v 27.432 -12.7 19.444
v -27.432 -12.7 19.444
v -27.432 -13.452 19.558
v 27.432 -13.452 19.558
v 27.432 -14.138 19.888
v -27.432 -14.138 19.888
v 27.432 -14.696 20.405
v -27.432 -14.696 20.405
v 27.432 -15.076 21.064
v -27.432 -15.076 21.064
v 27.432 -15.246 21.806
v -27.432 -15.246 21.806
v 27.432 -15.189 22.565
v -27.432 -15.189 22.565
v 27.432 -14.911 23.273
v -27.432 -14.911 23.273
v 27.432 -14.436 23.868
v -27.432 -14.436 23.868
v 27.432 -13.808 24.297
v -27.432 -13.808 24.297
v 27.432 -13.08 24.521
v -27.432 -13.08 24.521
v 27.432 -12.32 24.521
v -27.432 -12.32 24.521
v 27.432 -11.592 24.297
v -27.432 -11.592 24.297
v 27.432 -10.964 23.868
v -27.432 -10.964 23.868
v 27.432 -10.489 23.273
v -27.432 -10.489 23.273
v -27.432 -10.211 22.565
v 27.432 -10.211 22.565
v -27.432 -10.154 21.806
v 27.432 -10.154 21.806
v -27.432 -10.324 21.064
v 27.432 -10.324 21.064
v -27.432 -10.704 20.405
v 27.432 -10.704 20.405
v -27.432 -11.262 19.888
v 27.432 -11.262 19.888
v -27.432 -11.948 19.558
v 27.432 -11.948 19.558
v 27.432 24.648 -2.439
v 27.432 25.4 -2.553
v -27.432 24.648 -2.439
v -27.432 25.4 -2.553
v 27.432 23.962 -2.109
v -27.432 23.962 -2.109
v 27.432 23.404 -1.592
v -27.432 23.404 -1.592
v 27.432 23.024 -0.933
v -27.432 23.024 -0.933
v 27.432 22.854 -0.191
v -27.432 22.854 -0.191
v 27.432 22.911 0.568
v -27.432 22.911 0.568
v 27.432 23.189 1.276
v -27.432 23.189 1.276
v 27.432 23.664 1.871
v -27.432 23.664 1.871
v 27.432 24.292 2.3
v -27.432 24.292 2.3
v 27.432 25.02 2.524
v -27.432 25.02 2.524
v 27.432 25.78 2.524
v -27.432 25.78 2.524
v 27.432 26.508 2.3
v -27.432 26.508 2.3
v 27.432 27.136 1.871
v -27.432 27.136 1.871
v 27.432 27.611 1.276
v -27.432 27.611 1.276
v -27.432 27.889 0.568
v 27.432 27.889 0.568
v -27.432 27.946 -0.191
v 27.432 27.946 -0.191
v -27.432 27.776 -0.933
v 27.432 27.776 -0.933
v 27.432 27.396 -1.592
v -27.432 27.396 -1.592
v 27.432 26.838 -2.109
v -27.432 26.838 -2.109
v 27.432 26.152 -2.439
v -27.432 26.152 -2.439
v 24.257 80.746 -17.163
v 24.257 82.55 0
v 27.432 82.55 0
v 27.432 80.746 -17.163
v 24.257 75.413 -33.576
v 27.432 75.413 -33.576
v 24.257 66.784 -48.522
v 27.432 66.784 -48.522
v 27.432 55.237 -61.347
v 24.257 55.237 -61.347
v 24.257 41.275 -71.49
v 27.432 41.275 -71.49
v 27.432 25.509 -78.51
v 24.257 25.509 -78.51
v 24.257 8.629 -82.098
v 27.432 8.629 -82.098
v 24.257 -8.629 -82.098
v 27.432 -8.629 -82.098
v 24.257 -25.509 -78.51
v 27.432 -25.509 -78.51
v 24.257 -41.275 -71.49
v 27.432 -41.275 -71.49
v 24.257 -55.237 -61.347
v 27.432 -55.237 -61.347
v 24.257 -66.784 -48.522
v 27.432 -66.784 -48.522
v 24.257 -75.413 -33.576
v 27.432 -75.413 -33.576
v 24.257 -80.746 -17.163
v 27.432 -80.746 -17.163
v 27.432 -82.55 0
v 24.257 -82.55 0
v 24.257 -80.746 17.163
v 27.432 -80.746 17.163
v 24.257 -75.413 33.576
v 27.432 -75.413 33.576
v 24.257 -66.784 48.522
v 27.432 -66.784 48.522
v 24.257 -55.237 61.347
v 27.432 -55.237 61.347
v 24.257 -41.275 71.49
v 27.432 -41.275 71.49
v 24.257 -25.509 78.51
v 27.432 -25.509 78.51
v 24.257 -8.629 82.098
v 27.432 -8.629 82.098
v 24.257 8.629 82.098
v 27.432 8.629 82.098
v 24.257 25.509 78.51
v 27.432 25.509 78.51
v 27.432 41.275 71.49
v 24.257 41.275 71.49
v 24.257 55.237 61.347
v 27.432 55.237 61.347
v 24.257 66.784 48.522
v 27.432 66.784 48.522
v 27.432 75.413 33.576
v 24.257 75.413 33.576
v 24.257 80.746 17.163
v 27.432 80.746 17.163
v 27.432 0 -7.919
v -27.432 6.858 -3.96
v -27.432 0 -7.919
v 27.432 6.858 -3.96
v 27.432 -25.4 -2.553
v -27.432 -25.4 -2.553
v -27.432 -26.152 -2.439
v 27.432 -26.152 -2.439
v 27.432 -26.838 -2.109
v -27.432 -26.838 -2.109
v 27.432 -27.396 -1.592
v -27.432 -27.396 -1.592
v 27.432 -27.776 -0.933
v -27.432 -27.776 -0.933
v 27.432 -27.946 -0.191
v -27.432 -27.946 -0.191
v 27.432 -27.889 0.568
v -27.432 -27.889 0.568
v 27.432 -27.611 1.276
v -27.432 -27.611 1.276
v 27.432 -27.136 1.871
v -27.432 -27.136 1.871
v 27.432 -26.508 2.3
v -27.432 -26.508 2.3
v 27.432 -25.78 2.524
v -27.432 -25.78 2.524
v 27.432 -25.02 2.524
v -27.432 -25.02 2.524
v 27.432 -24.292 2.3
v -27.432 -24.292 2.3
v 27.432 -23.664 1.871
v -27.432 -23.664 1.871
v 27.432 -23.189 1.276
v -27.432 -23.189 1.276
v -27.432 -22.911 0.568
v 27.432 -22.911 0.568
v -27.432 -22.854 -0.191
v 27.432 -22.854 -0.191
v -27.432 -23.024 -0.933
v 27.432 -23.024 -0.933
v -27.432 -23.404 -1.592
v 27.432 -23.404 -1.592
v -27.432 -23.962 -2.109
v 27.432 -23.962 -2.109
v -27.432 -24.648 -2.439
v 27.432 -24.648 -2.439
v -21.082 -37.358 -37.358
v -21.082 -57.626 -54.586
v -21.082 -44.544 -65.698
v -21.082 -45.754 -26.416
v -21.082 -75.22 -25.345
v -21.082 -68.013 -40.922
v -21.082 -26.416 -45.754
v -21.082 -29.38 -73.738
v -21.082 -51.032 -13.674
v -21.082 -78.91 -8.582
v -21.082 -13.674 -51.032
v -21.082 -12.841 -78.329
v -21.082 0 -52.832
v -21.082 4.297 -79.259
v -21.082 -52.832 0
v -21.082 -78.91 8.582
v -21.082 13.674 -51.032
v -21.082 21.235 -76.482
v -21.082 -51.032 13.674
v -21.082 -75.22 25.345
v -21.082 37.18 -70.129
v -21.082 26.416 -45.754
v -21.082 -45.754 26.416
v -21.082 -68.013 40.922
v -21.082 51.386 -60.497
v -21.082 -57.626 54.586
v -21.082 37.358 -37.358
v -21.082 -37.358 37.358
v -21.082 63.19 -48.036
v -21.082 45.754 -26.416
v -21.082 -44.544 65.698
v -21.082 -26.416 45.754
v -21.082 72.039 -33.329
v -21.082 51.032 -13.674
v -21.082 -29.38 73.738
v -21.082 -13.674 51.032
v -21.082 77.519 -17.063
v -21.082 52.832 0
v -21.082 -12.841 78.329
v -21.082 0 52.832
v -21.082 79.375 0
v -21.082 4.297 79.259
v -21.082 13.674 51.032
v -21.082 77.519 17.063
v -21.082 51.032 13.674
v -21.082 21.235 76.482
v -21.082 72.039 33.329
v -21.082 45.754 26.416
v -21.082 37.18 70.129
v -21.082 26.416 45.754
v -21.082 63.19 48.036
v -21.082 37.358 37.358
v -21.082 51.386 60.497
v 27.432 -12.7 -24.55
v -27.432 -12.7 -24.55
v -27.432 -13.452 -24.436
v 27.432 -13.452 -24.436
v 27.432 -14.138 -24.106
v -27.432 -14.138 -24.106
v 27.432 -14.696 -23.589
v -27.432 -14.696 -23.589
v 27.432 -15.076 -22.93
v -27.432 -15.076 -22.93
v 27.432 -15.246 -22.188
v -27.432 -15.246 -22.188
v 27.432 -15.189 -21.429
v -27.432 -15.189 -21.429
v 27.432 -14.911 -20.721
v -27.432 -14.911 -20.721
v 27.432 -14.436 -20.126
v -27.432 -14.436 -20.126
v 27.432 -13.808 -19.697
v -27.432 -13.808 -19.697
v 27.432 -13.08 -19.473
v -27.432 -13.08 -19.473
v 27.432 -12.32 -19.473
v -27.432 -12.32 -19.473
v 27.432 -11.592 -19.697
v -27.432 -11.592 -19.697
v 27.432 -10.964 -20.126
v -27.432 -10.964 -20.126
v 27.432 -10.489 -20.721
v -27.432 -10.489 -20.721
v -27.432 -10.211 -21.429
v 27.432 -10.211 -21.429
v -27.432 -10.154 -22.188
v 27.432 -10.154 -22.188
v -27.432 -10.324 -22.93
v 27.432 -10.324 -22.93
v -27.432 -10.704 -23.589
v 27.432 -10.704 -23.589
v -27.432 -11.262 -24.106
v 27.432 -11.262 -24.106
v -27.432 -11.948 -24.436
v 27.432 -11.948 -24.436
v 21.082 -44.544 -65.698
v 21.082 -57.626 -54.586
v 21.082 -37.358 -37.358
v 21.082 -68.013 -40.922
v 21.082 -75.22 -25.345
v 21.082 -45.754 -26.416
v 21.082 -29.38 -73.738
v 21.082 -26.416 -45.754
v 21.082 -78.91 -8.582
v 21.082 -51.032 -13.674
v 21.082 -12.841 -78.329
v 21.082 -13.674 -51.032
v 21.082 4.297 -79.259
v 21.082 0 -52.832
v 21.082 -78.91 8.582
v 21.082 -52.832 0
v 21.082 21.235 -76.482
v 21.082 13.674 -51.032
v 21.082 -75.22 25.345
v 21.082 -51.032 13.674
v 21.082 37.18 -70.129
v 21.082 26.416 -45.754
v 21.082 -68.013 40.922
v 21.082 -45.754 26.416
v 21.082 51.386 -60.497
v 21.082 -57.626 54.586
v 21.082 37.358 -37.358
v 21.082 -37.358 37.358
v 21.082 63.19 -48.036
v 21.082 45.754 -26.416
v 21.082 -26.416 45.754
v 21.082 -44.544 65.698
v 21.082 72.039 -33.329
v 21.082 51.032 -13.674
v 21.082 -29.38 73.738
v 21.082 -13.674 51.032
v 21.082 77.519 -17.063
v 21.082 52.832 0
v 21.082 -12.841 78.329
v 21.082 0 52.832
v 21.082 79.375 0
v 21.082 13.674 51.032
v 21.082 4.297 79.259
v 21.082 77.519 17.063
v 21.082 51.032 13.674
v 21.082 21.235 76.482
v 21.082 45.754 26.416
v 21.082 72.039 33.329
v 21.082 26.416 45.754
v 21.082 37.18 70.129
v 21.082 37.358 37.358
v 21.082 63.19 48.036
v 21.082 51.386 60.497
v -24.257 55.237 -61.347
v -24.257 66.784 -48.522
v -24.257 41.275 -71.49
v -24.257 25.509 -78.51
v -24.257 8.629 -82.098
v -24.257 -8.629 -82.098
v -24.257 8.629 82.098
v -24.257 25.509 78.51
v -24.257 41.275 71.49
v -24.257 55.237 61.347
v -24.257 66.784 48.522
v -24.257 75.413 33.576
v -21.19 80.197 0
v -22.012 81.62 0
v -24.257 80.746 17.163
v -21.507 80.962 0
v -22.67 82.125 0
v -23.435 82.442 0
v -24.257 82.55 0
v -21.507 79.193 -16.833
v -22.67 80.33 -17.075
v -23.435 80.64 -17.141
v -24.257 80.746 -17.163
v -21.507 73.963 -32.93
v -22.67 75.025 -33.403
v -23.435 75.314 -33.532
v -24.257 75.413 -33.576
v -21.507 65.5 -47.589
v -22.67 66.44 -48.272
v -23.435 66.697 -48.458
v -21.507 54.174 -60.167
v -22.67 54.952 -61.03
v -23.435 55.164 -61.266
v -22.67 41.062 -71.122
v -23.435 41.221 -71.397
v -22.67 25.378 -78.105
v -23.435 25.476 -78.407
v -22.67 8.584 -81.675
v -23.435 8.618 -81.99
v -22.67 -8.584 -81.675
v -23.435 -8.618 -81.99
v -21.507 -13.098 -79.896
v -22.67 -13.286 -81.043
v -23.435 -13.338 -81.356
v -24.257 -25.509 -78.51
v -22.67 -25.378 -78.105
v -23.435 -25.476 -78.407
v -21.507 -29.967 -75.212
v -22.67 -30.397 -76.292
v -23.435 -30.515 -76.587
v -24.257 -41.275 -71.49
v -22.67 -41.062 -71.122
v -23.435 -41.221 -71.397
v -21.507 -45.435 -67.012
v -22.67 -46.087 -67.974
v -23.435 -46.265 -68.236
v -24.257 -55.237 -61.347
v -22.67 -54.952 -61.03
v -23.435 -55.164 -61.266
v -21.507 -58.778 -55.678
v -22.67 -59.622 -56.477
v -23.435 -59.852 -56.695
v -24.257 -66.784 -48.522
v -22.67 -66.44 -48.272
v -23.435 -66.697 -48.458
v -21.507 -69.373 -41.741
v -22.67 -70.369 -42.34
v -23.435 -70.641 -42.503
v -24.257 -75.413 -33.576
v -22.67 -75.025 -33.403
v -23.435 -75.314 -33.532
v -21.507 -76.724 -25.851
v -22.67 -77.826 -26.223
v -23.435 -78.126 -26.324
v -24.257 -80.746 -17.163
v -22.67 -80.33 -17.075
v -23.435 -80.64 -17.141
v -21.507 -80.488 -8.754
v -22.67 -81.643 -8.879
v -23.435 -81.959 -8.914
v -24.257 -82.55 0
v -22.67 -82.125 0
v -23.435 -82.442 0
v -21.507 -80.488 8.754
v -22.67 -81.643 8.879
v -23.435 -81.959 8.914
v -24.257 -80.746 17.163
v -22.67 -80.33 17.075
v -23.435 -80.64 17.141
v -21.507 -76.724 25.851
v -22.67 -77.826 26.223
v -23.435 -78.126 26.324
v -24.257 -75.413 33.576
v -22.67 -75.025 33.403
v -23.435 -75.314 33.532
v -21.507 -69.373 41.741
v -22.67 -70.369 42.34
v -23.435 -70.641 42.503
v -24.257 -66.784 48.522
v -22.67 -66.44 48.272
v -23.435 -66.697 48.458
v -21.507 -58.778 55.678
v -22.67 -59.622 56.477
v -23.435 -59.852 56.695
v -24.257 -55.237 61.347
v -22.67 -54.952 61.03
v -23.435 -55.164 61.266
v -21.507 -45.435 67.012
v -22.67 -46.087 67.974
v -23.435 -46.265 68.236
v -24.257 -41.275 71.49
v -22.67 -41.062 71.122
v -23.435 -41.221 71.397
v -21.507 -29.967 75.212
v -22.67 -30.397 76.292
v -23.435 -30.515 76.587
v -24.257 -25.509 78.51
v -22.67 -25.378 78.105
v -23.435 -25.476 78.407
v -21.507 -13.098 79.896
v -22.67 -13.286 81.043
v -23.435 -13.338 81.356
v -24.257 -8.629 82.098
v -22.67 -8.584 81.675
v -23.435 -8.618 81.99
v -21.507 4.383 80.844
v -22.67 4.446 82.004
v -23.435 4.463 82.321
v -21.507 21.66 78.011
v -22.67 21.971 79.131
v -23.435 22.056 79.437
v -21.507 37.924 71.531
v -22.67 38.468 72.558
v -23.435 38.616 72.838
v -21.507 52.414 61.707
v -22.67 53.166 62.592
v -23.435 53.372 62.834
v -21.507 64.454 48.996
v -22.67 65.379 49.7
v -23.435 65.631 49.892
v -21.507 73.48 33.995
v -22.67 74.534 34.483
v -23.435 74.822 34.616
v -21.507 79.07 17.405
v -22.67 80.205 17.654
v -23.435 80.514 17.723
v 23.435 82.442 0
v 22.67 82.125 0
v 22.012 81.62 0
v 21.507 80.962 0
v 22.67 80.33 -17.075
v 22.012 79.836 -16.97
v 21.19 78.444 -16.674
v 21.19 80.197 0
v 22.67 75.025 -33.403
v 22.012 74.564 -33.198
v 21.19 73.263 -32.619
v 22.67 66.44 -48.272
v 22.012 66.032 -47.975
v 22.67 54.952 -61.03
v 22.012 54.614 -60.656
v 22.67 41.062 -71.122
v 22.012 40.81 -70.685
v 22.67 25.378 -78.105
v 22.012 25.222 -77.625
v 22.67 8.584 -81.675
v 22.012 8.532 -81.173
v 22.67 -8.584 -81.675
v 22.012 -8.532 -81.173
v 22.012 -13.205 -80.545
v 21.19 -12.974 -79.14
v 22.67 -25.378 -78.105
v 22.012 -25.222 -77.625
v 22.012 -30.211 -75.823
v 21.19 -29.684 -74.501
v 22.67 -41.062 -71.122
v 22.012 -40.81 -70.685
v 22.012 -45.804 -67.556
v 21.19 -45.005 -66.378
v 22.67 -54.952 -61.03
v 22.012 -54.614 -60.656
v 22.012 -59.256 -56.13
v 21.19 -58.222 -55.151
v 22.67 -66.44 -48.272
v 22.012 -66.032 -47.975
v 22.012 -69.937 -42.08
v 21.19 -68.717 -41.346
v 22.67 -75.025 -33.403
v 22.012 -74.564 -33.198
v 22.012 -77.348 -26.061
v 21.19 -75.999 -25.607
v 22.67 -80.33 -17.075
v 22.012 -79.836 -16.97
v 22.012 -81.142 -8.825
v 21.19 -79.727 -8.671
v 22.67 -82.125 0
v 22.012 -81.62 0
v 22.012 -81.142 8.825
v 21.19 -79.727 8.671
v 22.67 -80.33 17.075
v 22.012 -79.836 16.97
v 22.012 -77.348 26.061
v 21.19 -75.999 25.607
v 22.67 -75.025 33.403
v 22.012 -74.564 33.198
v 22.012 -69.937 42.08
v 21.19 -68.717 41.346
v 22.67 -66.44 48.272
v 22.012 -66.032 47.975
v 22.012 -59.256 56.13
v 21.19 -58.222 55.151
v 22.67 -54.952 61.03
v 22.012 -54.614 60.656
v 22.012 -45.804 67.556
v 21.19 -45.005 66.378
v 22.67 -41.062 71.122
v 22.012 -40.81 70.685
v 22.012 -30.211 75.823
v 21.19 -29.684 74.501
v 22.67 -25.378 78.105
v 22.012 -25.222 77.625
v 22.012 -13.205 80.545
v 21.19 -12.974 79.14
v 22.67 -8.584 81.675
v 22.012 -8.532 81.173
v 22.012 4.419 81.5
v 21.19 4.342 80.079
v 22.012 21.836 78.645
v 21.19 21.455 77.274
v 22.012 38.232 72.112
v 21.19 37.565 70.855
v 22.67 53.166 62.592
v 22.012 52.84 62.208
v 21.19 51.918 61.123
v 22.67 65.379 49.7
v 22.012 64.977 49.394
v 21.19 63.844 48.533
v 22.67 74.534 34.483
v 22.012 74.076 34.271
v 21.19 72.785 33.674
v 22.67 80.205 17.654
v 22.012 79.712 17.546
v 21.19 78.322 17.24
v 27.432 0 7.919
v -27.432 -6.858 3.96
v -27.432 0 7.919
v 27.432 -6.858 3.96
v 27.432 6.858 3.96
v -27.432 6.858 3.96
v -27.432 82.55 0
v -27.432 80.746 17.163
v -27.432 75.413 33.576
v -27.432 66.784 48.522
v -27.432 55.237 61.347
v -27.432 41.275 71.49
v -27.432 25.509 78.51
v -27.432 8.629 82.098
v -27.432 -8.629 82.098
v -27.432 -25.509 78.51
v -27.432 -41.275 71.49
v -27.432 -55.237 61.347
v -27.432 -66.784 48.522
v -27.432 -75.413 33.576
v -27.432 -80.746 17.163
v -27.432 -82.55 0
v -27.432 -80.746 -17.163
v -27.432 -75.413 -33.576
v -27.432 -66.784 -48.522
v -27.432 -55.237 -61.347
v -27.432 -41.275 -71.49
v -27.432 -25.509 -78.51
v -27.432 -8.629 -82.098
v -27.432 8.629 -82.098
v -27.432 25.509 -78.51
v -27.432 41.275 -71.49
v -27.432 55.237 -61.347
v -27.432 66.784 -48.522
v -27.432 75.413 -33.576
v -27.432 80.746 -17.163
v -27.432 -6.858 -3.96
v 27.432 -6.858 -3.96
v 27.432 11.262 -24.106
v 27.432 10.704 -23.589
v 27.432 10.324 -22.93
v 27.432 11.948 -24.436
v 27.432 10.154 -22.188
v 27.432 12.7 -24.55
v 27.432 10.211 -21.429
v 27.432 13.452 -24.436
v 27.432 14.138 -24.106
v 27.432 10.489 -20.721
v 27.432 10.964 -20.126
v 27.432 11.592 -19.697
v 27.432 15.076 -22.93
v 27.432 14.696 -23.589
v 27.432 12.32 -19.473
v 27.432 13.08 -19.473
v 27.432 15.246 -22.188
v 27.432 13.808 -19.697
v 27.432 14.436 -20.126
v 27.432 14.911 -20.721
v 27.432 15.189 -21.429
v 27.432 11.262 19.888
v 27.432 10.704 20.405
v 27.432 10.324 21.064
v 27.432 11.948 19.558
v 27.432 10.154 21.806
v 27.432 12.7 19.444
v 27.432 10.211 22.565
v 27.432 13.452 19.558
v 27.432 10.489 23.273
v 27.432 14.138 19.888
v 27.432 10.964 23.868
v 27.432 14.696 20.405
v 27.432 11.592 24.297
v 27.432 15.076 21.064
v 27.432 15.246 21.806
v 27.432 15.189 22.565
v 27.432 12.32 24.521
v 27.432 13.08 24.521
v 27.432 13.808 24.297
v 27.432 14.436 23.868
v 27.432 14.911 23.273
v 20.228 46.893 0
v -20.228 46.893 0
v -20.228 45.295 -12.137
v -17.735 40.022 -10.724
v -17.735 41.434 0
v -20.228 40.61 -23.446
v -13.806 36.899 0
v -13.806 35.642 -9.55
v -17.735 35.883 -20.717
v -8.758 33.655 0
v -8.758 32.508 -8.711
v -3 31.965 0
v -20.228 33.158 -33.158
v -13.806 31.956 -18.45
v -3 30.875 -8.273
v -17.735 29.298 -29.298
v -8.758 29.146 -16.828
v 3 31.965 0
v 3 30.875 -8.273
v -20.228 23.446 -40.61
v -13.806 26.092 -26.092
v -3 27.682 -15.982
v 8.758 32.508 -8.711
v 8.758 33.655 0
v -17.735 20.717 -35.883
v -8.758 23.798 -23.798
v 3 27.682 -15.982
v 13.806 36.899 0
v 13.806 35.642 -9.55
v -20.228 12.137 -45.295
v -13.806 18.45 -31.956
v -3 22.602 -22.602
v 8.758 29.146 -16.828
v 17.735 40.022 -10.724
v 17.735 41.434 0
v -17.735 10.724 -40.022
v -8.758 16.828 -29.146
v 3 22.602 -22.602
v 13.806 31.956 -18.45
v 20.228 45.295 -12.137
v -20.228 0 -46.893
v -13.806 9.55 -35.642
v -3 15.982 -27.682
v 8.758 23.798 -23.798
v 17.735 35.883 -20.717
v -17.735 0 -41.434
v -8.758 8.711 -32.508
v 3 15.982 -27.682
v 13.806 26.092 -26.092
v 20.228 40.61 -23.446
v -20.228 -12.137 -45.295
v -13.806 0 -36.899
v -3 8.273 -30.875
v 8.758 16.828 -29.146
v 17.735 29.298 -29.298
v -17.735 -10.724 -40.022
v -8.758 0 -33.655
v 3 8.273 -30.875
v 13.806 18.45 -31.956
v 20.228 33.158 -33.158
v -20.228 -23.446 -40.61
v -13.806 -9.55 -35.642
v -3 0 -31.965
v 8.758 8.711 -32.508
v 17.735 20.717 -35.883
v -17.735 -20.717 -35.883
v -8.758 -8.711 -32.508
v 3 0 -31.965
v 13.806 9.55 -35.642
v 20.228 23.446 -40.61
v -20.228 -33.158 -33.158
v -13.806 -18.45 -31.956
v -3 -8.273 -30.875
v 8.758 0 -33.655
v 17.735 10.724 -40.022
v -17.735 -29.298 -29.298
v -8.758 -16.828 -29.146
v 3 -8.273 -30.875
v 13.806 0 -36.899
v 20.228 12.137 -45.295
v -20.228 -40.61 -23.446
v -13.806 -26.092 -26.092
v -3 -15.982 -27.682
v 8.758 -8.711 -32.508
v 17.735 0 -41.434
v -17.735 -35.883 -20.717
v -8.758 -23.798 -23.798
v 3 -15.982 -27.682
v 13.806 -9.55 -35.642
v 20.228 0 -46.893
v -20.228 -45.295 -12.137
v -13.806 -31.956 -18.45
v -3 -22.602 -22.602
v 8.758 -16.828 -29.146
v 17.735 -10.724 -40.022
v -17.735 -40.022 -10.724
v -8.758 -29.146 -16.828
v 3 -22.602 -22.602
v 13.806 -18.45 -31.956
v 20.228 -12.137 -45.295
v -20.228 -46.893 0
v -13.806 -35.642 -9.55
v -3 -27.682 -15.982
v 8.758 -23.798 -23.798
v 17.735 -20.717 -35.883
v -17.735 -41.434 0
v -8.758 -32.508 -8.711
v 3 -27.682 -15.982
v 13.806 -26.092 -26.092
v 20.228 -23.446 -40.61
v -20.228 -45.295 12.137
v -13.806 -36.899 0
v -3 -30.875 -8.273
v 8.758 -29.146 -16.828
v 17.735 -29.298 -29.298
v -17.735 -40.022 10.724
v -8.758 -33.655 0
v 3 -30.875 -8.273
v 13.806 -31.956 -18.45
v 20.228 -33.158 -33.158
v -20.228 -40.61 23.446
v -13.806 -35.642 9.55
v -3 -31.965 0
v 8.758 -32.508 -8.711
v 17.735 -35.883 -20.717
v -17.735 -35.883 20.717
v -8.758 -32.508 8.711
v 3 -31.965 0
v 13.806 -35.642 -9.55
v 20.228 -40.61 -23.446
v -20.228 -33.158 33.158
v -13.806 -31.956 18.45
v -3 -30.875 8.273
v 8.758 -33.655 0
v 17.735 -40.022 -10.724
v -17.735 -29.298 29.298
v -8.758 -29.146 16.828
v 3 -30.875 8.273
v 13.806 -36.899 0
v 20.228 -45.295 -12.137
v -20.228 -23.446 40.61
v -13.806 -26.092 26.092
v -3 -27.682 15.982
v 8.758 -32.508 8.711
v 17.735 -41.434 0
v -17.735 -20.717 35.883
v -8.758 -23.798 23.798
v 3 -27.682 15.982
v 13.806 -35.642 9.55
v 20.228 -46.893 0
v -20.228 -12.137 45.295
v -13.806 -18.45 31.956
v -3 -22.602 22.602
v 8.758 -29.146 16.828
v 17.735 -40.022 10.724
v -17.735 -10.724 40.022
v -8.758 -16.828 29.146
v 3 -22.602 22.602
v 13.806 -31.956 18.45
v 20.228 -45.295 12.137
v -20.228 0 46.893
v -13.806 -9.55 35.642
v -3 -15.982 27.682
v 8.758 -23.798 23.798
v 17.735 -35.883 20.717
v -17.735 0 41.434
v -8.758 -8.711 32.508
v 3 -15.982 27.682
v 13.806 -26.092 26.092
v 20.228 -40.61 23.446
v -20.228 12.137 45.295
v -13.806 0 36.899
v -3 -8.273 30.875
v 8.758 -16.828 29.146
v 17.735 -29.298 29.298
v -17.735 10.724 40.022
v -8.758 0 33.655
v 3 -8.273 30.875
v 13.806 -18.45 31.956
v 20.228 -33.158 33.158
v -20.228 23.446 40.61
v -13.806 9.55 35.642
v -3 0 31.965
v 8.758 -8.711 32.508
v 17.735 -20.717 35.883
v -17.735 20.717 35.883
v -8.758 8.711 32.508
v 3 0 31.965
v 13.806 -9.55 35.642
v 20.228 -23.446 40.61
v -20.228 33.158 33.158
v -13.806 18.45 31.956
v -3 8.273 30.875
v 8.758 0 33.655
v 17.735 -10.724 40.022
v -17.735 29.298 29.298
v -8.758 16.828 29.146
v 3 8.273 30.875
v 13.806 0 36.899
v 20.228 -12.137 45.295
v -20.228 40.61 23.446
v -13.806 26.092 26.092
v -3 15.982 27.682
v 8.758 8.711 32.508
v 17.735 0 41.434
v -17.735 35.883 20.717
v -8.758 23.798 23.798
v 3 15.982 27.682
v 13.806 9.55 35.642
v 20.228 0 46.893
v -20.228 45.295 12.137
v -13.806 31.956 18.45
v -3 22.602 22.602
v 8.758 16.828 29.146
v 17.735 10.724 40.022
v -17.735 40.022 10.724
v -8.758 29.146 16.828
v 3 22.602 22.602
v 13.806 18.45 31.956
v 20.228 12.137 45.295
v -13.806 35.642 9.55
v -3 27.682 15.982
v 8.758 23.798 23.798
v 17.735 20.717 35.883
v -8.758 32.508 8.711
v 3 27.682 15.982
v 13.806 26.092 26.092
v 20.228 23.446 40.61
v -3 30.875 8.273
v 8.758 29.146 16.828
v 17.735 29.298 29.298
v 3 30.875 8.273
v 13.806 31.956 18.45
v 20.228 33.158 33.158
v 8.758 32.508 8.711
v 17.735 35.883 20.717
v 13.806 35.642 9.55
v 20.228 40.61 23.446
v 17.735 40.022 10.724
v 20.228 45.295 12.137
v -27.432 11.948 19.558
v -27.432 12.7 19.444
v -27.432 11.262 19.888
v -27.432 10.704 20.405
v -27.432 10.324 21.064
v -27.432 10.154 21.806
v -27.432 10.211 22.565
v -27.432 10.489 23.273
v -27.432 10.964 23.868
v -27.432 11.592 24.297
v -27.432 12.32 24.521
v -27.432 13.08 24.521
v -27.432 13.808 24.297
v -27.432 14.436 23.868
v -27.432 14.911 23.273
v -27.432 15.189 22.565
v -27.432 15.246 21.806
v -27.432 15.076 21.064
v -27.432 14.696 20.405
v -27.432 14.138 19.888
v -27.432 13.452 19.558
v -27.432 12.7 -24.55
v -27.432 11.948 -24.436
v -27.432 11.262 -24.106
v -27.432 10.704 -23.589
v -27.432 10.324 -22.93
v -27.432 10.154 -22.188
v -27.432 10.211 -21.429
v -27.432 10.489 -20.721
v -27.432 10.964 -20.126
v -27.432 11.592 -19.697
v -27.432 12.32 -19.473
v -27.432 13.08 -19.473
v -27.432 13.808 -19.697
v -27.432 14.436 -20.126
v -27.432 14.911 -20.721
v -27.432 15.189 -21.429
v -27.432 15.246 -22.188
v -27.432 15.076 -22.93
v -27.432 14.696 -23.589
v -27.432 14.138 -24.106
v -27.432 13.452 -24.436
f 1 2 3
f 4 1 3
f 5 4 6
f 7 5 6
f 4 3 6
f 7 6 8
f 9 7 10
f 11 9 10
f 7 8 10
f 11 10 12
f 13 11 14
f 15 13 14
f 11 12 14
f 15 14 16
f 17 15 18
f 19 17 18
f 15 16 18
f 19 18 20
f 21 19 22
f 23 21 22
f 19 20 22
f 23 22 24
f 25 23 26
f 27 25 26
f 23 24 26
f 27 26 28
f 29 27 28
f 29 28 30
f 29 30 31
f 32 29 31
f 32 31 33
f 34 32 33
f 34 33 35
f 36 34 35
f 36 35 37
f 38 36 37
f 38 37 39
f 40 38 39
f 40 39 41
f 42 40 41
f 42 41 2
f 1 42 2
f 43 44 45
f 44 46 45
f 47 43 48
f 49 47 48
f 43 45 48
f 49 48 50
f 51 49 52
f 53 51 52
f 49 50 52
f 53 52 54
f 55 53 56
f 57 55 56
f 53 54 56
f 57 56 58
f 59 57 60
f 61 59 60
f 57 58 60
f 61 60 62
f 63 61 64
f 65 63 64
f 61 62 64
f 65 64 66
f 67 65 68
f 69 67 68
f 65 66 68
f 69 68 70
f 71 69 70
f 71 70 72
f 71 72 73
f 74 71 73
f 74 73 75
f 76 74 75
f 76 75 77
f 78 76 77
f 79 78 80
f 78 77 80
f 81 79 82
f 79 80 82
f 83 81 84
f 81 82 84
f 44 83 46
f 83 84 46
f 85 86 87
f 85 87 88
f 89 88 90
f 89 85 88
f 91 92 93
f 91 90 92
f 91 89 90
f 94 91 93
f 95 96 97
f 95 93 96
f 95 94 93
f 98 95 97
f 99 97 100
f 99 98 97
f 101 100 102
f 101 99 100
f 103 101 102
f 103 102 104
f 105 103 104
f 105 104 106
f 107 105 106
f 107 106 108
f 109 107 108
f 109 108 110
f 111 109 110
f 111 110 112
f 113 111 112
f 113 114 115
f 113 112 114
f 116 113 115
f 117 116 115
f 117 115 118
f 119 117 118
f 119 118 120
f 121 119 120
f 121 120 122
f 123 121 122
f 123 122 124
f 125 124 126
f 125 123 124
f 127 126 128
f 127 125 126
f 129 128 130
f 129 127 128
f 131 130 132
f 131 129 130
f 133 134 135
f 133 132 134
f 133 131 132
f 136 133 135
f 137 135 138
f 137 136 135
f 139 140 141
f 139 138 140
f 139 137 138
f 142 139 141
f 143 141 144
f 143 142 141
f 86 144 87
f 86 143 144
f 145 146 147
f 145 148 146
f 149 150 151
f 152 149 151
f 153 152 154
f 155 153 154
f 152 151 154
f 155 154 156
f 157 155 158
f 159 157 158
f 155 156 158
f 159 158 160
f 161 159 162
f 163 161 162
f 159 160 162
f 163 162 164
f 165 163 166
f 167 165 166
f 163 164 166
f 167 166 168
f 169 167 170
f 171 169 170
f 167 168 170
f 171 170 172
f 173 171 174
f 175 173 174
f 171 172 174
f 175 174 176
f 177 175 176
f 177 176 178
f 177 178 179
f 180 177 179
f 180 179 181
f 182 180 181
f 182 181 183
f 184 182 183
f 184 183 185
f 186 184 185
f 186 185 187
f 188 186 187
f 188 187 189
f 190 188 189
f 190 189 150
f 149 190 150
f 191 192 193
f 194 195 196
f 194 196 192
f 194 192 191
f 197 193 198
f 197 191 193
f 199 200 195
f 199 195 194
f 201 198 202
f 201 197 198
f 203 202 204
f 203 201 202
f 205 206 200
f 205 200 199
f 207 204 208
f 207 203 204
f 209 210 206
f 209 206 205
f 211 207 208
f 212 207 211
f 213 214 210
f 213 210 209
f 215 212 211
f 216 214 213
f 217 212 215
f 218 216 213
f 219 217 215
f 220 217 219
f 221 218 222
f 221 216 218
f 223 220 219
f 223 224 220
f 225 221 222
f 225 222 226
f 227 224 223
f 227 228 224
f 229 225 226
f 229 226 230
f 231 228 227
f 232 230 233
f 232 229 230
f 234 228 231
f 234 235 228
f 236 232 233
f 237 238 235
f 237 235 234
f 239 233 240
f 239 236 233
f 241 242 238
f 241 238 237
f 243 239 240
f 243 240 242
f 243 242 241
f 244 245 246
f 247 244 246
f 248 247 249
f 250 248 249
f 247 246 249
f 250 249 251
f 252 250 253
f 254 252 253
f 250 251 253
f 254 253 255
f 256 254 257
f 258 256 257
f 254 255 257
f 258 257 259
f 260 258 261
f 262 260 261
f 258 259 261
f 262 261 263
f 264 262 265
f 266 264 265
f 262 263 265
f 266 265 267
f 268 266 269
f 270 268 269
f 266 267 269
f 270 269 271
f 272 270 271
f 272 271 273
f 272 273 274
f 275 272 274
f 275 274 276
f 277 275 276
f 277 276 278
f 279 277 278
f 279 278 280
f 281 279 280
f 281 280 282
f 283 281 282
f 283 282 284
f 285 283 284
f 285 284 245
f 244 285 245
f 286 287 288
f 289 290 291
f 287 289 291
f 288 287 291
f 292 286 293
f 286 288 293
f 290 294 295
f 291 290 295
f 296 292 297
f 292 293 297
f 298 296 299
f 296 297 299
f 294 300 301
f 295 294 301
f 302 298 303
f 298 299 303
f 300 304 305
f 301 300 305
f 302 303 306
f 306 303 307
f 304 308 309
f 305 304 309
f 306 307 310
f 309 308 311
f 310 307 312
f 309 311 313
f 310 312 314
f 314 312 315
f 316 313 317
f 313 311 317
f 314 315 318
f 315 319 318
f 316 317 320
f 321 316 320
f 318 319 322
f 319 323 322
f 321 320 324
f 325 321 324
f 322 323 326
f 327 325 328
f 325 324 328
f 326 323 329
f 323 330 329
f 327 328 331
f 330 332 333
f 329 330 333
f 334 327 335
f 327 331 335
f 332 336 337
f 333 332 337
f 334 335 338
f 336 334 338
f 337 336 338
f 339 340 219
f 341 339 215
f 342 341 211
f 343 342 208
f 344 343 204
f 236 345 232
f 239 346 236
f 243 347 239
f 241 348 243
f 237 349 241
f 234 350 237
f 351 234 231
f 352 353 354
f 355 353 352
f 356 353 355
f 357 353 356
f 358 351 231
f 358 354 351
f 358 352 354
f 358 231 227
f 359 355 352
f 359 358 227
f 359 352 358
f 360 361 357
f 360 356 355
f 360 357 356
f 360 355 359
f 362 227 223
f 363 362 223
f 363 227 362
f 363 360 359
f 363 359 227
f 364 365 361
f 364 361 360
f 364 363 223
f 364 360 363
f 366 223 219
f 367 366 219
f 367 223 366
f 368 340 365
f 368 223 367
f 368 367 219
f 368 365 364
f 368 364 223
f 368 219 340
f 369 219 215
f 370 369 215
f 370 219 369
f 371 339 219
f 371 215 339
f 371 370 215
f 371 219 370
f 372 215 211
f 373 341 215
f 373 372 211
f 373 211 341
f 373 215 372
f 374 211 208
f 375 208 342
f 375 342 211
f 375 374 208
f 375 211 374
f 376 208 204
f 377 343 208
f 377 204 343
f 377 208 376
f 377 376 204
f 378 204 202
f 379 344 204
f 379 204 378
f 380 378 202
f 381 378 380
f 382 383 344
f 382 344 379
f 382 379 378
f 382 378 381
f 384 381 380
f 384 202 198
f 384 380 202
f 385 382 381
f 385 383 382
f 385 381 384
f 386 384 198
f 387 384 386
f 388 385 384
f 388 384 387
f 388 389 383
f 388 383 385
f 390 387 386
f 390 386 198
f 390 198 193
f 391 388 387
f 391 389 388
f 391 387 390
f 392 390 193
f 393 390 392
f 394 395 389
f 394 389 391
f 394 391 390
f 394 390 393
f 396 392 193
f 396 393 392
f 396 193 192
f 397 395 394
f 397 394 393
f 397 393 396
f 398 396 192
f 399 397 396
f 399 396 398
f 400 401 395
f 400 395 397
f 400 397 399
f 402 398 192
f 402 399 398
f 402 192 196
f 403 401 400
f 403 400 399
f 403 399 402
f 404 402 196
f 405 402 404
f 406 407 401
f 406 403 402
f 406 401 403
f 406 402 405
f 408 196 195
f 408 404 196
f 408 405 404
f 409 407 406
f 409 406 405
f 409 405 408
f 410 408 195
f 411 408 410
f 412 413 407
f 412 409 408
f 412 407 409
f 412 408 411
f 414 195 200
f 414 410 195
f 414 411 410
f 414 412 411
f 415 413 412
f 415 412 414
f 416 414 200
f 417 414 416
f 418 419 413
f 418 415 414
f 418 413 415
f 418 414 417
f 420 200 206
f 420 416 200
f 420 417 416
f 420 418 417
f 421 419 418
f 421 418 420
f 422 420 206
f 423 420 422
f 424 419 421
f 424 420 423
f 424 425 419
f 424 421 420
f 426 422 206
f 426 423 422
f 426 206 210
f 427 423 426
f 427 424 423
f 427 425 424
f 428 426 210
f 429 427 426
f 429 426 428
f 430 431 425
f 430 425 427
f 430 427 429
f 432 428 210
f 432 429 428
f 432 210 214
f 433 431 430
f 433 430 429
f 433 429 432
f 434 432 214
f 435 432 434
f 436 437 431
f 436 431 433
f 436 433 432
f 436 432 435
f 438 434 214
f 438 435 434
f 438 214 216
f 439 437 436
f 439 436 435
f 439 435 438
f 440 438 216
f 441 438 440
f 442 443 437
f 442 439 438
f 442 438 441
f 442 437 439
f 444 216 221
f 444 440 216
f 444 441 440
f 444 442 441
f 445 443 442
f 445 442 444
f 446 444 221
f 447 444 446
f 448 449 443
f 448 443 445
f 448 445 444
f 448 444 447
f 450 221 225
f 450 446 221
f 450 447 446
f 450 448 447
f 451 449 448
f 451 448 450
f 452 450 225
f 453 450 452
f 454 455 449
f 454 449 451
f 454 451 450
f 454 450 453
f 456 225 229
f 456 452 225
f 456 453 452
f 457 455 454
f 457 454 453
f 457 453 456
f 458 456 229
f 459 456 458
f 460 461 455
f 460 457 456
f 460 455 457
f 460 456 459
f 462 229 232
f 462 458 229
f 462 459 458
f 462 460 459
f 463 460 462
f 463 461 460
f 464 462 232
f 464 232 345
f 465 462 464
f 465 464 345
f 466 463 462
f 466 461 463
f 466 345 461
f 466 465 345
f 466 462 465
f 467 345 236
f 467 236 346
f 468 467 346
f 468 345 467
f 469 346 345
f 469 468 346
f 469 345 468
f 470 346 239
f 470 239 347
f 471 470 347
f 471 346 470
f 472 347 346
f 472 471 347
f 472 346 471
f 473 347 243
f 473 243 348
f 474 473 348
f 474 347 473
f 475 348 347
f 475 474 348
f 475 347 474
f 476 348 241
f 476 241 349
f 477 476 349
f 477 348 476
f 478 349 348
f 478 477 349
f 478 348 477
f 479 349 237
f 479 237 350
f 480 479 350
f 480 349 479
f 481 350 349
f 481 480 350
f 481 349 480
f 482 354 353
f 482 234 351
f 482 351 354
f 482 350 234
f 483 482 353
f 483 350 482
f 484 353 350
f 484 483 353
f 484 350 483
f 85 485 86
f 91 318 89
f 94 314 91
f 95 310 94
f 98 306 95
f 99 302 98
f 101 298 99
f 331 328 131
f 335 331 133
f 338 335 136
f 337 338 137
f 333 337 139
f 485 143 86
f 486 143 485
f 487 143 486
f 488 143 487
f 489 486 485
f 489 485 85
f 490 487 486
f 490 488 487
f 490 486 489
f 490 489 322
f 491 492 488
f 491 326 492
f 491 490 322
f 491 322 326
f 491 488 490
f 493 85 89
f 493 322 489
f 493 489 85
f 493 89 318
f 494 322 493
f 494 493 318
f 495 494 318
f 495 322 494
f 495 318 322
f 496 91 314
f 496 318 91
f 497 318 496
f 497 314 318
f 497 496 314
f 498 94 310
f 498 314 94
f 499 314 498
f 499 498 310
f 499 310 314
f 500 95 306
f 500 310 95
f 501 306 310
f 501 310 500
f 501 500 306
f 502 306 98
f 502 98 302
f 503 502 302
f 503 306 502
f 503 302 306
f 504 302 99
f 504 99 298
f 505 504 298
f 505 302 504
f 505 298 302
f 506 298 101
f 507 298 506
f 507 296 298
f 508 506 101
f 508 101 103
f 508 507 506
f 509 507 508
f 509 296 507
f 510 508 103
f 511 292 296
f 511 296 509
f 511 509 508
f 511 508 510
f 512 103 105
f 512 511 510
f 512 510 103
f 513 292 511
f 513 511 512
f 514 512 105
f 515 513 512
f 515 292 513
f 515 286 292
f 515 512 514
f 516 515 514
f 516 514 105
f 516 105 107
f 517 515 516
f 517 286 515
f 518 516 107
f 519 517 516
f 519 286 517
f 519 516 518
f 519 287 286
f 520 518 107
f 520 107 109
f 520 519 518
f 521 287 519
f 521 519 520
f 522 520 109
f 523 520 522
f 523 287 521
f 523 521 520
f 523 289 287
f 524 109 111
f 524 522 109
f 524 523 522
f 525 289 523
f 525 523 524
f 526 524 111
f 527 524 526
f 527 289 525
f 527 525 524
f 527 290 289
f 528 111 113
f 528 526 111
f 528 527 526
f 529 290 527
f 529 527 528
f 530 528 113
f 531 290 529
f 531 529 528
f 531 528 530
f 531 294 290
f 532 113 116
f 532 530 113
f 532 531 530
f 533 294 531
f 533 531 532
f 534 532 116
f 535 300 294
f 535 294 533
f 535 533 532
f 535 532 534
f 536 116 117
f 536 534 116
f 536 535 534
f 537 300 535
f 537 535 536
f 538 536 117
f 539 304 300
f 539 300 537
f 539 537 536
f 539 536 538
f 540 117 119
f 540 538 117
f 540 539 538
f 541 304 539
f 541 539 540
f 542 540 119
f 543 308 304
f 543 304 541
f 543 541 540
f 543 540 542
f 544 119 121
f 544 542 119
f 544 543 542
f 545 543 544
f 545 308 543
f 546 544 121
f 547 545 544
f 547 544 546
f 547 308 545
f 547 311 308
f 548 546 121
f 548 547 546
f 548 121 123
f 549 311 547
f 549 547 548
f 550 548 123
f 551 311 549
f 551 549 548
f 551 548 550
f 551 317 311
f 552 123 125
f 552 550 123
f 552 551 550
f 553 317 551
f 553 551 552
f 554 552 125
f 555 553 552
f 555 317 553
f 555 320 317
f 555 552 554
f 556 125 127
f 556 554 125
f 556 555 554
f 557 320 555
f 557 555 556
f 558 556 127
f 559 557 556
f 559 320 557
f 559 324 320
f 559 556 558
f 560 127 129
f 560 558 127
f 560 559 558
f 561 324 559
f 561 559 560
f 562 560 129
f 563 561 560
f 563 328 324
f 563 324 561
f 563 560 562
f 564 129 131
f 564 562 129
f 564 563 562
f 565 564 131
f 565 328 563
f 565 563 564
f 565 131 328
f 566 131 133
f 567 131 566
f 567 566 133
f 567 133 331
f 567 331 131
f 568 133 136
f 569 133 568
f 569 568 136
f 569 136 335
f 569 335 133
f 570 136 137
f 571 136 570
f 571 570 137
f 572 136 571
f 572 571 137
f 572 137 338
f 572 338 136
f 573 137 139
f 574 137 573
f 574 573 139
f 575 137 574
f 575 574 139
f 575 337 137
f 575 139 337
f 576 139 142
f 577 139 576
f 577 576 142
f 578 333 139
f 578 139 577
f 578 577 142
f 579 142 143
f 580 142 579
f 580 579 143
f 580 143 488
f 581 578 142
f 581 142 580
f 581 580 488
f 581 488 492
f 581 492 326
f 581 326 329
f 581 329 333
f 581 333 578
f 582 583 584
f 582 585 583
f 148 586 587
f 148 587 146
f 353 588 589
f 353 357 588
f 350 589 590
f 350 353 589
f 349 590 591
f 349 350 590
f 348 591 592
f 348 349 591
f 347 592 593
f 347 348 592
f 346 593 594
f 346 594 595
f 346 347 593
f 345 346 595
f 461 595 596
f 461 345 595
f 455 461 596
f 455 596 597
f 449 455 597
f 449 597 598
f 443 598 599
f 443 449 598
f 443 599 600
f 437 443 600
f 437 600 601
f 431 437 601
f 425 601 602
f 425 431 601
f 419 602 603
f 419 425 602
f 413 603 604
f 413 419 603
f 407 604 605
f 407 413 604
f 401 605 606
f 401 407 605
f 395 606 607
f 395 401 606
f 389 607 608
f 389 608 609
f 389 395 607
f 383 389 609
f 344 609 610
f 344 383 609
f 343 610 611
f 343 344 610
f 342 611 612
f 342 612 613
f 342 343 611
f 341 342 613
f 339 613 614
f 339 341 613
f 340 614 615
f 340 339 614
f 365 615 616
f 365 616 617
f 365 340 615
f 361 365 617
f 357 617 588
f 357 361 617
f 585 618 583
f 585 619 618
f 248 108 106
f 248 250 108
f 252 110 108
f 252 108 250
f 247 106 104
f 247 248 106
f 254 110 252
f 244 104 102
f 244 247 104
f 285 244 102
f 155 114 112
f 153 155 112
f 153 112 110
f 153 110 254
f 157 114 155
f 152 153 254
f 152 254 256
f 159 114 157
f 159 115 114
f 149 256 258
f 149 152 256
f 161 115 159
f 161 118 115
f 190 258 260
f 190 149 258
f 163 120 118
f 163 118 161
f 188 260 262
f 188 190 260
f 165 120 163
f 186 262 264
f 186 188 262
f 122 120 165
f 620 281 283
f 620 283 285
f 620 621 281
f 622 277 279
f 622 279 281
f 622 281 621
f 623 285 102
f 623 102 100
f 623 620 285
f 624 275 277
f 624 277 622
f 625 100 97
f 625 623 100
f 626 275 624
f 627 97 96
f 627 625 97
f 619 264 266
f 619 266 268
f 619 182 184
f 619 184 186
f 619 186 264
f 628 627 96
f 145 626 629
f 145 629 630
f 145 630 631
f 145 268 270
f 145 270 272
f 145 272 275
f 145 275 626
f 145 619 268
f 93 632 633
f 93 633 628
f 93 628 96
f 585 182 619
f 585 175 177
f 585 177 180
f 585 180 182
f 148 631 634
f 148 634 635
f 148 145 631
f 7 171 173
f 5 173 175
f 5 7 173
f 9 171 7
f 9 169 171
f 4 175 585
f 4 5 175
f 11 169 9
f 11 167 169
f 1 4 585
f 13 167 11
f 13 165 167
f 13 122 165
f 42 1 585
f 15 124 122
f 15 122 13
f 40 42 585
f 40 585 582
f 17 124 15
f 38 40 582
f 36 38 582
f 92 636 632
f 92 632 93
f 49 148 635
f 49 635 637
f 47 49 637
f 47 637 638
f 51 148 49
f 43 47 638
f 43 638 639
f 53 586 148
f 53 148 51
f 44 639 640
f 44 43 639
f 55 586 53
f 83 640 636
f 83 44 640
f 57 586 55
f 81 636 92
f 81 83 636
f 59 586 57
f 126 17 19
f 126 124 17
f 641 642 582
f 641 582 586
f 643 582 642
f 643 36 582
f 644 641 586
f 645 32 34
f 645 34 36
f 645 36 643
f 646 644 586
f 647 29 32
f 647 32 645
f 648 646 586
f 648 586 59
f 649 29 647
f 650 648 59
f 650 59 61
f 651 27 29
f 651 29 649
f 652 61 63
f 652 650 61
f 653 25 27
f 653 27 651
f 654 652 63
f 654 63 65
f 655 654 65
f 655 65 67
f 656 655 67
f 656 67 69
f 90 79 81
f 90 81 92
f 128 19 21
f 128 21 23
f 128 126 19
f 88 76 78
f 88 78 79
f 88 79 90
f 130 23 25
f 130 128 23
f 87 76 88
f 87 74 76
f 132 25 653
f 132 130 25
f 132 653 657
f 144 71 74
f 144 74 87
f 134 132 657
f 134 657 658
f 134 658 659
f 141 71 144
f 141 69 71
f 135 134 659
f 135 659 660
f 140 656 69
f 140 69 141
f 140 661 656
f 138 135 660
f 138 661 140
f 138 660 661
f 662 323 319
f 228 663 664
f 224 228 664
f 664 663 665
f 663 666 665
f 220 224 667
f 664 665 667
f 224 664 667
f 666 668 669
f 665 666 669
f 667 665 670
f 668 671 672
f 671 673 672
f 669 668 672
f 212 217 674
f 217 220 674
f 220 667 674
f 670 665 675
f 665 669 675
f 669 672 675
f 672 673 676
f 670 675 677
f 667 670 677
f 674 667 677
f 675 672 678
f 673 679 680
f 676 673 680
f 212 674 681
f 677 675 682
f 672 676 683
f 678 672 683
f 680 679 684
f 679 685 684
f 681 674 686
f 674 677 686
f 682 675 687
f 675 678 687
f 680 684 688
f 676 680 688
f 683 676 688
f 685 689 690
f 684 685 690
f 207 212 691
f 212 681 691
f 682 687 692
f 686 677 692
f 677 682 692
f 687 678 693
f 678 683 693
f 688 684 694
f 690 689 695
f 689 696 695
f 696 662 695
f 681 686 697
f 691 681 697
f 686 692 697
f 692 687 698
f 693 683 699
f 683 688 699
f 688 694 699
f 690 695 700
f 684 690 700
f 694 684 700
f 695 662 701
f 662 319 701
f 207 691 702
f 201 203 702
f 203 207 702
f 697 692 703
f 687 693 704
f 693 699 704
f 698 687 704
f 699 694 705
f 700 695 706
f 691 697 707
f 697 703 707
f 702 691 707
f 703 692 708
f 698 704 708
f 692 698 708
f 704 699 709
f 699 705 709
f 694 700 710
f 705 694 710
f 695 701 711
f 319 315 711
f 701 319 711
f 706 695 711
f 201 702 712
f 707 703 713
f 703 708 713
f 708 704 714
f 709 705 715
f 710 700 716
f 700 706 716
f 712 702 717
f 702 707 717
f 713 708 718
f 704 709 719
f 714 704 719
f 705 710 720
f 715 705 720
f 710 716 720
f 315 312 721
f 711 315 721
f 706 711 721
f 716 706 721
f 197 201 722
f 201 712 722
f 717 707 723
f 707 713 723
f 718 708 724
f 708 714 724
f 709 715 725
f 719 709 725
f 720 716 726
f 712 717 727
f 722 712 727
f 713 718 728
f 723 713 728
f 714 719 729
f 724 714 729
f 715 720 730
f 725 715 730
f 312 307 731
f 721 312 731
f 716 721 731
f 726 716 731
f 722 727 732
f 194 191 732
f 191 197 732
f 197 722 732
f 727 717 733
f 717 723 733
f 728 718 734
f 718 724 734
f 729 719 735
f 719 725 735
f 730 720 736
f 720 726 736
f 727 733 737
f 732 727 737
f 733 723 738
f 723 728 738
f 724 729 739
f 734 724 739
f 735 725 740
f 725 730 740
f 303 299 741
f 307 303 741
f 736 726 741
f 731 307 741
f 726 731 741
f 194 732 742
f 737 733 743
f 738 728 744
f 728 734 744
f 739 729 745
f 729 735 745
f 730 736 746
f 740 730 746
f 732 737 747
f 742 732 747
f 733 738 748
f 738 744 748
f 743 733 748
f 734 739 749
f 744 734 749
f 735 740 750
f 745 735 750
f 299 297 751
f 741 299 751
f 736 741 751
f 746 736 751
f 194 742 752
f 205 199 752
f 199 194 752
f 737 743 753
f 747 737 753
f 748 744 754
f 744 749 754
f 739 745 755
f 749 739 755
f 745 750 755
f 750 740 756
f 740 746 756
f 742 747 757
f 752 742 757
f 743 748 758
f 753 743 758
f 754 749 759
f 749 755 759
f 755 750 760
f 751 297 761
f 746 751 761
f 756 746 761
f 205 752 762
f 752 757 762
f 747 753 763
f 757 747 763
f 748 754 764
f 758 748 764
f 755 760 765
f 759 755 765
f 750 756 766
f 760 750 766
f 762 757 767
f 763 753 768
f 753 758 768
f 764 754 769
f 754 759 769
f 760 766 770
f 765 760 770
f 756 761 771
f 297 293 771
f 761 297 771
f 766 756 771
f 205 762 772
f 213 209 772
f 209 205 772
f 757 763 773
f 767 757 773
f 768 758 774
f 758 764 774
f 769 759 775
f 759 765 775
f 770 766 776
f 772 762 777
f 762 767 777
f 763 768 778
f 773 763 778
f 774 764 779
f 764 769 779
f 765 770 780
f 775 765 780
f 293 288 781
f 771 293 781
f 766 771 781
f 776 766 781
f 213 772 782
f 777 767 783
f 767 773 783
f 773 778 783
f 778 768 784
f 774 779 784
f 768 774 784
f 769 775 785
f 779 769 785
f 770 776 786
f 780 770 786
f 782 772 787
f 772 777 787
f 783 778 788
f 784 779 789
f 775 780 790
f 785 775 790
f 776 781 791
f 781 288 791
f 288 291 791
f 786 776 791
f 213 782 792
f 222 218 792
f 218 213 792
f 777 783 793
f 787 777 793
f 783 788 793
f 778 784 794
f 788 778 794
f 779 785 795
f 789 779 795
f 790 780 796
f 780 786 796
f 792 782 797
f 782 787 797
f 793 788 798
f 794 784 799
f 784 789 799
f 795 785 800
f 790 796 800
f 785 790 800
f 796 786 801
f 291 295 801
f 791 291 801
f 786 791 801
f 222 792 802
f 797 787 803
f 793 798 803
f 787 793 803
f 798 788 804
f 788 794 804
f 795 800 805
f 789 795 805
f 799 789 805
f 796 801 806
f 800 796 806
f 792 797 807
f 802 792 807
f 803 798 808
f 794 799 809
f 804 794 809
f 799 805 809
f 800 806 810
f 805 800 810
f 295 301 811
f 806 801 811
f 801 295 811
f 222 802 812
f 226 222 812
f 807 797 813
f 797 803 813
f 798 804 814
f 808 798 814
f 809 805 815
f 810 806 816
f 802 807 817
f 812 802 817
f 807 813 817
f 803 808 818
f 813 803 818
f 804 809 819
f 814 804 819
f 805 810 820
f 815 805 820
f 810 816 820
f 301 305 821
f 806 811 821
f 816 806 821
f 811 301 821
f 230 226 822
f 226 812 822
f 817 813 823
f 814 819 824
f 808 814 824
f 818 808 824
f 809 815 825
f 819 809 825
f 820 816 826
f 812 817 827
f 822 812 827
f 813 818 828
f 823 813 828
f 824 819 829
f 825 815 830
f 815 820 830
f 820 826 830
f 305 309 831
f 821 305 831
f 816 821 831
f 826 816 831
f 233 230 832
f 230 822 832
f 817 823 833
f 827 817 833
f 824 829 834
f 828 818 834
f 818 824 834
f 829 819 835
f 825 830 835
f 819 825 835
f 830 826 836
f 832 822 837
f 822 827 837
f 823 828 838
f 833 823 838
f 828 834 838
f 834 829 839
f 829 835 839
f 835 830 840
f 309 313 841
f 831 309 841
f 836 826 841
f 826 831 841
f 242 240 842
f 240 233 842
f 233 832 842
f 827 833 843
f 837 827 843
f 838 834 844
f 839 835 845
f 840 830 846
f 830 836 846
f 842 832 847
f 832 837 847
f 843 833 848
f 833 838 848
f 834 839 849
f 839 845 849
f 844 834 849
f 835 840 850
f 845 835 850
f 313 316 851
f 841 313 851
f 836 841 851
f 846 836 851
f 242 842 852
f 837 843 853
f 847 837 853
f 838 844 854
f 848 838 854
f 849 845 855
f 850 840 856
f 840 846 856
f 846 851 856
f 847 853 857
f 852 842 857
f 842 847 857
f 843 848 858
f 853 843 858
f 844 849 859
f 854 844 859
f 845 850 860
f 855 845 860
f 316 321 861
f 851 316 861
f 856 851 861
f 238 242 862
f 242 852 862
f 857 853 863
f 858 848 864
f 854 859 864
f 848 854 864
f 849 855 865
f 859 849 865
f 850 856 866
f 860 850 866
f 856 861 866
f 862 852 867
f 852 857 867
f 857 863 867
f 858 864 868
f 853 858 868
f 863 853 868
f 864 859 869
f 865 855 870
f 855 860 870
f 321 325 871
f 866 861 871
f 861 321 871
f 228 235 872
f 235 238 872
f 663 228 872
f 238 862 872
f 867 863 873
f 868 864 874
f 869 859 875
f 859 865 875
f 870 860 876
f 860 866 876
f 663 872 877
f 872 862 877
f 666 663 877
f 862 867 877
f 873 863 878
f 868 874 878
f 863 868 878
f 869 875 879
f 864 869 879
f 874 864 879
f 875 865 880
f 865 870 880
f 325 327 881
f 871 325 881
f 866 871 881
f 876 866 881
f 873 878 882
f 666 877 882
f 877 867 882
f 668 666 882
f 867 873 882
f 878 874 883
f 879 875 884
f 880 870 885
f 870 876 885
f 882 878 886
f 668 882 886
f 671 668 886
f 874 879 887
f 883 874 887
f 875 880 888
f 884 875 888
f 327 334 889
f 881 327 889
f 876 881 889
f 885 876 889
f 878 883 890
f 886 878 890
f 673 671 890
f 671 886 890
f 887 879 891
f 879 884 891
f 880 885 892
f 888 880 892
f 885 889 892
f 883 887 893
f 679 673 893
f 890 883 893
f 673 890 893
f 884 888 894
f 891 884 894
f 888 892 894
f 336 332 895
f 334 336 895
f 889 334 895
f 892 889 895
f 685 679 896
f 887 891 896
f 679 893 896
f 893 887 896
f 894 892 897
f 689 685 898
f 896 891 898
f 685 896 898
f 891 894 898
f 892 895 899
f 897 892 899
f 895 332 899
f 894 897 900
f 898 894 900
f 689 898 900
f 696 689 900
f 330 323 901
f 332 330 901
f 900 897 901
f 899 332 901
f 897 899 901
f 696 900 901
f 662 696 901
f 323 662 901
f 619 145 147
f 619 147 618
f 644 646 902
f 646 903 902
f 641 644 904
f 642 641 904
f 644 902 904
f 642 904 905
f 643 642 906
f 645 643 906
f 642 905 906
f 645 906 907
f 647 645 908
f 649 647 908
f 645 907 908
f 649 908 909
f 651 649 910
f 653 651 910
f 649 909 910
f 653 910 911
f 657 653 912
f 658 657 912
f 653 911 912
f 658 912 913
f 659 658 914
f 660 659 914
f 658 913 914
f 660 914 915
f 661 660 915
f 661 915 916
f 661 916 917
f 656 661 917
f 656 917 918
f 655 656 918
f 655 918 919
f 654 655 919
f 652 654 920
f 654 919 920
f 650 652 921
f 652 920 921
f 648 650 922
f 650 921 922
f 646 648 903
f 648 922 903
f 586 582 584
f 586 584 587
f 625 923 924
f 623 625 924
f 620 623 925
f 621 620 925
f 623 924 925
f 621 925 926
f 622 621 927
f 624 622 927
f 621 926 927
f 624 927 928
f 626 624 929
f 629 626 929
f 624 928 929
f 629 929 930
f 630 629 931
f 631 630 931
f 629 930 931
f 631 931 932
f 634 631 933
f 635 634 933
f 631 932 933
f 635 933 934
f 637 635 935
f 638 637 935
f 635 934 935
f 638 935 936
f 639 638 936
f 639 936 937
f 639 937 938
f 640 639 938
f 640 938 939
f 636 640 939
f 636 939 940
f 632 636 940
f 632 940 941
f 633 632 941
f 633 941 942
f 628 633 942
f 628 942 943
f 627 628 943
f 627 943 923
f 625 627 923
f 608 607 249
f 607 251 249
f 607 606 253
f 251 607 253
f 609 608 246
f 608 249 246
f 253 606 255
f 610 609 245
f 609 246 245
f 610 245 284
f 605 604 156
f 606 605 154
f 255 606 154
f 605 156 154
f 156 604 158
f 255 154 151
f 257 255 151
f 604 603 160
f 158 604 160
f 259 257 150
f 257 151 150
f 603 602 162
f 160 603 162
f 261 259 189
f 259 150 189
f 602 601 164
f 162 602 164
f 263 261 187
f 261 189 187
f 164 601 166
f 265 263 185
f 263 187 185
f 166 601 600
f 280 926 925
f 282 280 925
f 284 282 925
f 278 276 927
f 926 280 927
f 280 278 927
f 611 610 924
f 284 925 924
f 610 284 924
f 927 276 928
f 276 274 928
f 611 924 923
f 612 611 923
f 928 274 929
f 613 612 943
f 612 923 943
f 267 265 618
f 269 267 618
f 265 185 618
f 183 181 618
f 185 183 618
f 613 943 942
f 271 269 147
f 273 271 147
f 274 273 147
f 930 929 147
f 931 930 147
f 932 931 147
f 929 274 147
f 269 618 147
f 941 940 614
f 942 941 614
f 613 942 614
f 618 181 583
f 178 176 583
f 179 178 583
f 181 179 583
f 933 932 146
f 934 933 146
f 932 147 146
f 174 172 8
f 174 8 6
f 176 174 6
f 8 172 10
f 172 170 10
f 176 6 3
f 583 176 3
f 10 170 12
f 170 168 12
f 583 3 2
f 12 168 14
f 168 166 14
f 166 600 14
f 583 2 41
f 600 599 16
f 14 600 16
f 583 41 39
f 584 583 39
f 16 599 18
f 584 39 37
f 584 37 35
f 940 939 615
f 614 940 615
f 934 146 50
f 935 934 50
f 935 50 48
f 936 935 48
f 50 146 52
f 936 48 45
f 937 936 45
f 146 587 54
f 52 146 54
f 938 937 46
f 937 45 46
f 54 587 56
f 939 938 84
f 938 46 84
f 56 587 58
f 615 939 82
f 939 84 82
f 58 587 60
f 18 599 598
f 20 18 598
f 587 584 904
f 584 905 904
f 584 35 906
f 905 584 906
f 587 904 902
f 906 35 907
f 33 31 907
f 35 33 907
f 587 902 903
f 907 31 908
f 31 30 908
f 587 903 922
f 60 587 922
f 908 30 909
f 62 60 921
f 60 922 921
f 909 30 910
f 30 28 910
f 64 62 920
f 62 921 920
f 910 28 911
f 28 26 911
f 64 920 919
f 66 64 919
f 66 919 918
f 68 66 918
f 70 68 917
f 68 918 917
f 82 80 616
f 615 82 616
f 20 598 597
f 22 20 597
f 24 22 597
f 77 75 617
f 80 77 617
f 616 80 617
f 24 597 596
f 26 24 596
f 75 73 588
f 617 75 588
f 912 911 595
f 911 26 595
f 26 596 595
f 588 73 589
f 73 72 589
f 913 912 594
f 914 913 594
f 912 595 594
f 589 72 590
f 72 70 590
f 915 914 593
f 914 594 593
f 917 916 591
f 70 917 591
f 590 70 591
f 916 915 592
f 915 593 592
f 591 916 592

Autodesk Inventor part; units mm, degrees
ref_plane "YZ Plane" through (0, 0, 0) normal (1, 0, 0) x (0, 1, 0)
ref_plane "XZ Plane" through (0, 0, 0) normal (0, 1, 0) x (-1, 0, 0)
ref_plane "XY Plane" through (0, 0, 0) normal (0, 0, 1) x (1, 0, 0)
sketch "Sketch1" plane through (0, 0, 0) normal (0, 0, 1) x (1, 0, 0)
  arc A0 (-21.082, 52.832) -> (21.082, 52.832) centre (0, 52.832) ccw
  line L0 (-21.082, 52.832) -> (-21.082, 0)
  line L1 (21.082, 52.832) -> (21.082, 0)
  line L2 (-21.082, 0) -> (21.082, 0)
  line L3 (-21.082, 0) -> (-27.432, 0)
  line L4 (-27.432, 0) -> (-27.432, 82.55)
  line L5 (-27.432, 82.55) -> (-24.257, 82.55)
  line L6 (-21.082, 79.375) -> (-21.082, 0)
  line L7 (21.082, 0) -> (27.432, 0)
  line L8 (27.432, 0) -> (27.432, 82.55)
  line L9 (27.432, 82.55) -> (24.257, 82.55)
  line L10 (21.082, 79.375) -> (21.082, 0)
  line L11 (0, 0) -> (-27.432, 0) construction
  arc A1 (24.257, 82.55) -> (21.082, 79.375) centre (24.257, 79.375) ccw
  arc A2 (-21.082, 79.375) -> (-24.257, 82.55) centre (-24.257, 79.375) ccw
  point P0 (-21.082, 82.55)
  point P1 (21.082, 82.55)
  dimension "diameterOfPipe" = 42.164
  dimension "d6" = 6.35
  dimension "d8" = 6.35
  dimension "d27" = 82.55
  dimension "d28" = 52.832
  dimension "d29" = 31.75
  dimension "d30" = 3.175
revolve "Revolution1" add sketch "Sketch1" angle 360 about axis through (-21.082, 0, 0) along (1, 0, 0)
sketch "Sketch3" plane through (27.432, 0, 0) normal (1, 0, 0) x (0, 0, -1)
  line L0 (7.9189, 0) -> (3.9595, -6.858)
  line L1 (3.9595, -6.858) -> (-3.9595, -6.858)
  line L2 (-3.9595, -6.858) -> (-7.9189, 0)
  line L3 (-7.9189, 0) -> (-3.9595, 6.858)
  line L4 (-3.9595, 6.858) -> (3.9595, 6.858)
  line L5 (3.9595, 6.858) -> (7.9189, 0)
  point P0 (0, 0)
  point P1 (0, 0)
  dimension "hexWidth" = 13.716
extrude "Extrusion2" cut sketch "Sketch3" against normal through all
sketch "Sketch4" plane through (27.432, 0, 0) normal (1, 0, 0) x (0, 0, -1)
  point P0 (0, 0)
  point P1 (0, 25.4)
  point P2 (-21.997, 12.7)
  point P3 (-21.997, -12.7)
  point P4 (0, -25.4)
  point P5 (21.997, -12.7)
  point P6 (21.997, 12.7)
  dimension "d14" = 25.4
  dimension "d17" = 360
hole "Hole1" at (27.432, 25.4, 0) at (27.432, 12.7, 21.997) at (27.432, -12.7, 21.997) at (27.432, -25.4, 0) at (27.432, -12.7, -21.997) at (27.432, 12.7, -21.997) direction (-1, 0, 0) diameter 5.1054 end through all clearance for "Flat Head Machine Screw (82)" size "#10" standard "Ansi Unified Screw Threads"
equation "\"d6\" = widthOfOutside"
equation "\"d8\" = widthOfOutside"
equation "\"widthOfOutside\" = 6.35"
properties part number "WheelForHangingAndMoving" material "PBT Plastic"
